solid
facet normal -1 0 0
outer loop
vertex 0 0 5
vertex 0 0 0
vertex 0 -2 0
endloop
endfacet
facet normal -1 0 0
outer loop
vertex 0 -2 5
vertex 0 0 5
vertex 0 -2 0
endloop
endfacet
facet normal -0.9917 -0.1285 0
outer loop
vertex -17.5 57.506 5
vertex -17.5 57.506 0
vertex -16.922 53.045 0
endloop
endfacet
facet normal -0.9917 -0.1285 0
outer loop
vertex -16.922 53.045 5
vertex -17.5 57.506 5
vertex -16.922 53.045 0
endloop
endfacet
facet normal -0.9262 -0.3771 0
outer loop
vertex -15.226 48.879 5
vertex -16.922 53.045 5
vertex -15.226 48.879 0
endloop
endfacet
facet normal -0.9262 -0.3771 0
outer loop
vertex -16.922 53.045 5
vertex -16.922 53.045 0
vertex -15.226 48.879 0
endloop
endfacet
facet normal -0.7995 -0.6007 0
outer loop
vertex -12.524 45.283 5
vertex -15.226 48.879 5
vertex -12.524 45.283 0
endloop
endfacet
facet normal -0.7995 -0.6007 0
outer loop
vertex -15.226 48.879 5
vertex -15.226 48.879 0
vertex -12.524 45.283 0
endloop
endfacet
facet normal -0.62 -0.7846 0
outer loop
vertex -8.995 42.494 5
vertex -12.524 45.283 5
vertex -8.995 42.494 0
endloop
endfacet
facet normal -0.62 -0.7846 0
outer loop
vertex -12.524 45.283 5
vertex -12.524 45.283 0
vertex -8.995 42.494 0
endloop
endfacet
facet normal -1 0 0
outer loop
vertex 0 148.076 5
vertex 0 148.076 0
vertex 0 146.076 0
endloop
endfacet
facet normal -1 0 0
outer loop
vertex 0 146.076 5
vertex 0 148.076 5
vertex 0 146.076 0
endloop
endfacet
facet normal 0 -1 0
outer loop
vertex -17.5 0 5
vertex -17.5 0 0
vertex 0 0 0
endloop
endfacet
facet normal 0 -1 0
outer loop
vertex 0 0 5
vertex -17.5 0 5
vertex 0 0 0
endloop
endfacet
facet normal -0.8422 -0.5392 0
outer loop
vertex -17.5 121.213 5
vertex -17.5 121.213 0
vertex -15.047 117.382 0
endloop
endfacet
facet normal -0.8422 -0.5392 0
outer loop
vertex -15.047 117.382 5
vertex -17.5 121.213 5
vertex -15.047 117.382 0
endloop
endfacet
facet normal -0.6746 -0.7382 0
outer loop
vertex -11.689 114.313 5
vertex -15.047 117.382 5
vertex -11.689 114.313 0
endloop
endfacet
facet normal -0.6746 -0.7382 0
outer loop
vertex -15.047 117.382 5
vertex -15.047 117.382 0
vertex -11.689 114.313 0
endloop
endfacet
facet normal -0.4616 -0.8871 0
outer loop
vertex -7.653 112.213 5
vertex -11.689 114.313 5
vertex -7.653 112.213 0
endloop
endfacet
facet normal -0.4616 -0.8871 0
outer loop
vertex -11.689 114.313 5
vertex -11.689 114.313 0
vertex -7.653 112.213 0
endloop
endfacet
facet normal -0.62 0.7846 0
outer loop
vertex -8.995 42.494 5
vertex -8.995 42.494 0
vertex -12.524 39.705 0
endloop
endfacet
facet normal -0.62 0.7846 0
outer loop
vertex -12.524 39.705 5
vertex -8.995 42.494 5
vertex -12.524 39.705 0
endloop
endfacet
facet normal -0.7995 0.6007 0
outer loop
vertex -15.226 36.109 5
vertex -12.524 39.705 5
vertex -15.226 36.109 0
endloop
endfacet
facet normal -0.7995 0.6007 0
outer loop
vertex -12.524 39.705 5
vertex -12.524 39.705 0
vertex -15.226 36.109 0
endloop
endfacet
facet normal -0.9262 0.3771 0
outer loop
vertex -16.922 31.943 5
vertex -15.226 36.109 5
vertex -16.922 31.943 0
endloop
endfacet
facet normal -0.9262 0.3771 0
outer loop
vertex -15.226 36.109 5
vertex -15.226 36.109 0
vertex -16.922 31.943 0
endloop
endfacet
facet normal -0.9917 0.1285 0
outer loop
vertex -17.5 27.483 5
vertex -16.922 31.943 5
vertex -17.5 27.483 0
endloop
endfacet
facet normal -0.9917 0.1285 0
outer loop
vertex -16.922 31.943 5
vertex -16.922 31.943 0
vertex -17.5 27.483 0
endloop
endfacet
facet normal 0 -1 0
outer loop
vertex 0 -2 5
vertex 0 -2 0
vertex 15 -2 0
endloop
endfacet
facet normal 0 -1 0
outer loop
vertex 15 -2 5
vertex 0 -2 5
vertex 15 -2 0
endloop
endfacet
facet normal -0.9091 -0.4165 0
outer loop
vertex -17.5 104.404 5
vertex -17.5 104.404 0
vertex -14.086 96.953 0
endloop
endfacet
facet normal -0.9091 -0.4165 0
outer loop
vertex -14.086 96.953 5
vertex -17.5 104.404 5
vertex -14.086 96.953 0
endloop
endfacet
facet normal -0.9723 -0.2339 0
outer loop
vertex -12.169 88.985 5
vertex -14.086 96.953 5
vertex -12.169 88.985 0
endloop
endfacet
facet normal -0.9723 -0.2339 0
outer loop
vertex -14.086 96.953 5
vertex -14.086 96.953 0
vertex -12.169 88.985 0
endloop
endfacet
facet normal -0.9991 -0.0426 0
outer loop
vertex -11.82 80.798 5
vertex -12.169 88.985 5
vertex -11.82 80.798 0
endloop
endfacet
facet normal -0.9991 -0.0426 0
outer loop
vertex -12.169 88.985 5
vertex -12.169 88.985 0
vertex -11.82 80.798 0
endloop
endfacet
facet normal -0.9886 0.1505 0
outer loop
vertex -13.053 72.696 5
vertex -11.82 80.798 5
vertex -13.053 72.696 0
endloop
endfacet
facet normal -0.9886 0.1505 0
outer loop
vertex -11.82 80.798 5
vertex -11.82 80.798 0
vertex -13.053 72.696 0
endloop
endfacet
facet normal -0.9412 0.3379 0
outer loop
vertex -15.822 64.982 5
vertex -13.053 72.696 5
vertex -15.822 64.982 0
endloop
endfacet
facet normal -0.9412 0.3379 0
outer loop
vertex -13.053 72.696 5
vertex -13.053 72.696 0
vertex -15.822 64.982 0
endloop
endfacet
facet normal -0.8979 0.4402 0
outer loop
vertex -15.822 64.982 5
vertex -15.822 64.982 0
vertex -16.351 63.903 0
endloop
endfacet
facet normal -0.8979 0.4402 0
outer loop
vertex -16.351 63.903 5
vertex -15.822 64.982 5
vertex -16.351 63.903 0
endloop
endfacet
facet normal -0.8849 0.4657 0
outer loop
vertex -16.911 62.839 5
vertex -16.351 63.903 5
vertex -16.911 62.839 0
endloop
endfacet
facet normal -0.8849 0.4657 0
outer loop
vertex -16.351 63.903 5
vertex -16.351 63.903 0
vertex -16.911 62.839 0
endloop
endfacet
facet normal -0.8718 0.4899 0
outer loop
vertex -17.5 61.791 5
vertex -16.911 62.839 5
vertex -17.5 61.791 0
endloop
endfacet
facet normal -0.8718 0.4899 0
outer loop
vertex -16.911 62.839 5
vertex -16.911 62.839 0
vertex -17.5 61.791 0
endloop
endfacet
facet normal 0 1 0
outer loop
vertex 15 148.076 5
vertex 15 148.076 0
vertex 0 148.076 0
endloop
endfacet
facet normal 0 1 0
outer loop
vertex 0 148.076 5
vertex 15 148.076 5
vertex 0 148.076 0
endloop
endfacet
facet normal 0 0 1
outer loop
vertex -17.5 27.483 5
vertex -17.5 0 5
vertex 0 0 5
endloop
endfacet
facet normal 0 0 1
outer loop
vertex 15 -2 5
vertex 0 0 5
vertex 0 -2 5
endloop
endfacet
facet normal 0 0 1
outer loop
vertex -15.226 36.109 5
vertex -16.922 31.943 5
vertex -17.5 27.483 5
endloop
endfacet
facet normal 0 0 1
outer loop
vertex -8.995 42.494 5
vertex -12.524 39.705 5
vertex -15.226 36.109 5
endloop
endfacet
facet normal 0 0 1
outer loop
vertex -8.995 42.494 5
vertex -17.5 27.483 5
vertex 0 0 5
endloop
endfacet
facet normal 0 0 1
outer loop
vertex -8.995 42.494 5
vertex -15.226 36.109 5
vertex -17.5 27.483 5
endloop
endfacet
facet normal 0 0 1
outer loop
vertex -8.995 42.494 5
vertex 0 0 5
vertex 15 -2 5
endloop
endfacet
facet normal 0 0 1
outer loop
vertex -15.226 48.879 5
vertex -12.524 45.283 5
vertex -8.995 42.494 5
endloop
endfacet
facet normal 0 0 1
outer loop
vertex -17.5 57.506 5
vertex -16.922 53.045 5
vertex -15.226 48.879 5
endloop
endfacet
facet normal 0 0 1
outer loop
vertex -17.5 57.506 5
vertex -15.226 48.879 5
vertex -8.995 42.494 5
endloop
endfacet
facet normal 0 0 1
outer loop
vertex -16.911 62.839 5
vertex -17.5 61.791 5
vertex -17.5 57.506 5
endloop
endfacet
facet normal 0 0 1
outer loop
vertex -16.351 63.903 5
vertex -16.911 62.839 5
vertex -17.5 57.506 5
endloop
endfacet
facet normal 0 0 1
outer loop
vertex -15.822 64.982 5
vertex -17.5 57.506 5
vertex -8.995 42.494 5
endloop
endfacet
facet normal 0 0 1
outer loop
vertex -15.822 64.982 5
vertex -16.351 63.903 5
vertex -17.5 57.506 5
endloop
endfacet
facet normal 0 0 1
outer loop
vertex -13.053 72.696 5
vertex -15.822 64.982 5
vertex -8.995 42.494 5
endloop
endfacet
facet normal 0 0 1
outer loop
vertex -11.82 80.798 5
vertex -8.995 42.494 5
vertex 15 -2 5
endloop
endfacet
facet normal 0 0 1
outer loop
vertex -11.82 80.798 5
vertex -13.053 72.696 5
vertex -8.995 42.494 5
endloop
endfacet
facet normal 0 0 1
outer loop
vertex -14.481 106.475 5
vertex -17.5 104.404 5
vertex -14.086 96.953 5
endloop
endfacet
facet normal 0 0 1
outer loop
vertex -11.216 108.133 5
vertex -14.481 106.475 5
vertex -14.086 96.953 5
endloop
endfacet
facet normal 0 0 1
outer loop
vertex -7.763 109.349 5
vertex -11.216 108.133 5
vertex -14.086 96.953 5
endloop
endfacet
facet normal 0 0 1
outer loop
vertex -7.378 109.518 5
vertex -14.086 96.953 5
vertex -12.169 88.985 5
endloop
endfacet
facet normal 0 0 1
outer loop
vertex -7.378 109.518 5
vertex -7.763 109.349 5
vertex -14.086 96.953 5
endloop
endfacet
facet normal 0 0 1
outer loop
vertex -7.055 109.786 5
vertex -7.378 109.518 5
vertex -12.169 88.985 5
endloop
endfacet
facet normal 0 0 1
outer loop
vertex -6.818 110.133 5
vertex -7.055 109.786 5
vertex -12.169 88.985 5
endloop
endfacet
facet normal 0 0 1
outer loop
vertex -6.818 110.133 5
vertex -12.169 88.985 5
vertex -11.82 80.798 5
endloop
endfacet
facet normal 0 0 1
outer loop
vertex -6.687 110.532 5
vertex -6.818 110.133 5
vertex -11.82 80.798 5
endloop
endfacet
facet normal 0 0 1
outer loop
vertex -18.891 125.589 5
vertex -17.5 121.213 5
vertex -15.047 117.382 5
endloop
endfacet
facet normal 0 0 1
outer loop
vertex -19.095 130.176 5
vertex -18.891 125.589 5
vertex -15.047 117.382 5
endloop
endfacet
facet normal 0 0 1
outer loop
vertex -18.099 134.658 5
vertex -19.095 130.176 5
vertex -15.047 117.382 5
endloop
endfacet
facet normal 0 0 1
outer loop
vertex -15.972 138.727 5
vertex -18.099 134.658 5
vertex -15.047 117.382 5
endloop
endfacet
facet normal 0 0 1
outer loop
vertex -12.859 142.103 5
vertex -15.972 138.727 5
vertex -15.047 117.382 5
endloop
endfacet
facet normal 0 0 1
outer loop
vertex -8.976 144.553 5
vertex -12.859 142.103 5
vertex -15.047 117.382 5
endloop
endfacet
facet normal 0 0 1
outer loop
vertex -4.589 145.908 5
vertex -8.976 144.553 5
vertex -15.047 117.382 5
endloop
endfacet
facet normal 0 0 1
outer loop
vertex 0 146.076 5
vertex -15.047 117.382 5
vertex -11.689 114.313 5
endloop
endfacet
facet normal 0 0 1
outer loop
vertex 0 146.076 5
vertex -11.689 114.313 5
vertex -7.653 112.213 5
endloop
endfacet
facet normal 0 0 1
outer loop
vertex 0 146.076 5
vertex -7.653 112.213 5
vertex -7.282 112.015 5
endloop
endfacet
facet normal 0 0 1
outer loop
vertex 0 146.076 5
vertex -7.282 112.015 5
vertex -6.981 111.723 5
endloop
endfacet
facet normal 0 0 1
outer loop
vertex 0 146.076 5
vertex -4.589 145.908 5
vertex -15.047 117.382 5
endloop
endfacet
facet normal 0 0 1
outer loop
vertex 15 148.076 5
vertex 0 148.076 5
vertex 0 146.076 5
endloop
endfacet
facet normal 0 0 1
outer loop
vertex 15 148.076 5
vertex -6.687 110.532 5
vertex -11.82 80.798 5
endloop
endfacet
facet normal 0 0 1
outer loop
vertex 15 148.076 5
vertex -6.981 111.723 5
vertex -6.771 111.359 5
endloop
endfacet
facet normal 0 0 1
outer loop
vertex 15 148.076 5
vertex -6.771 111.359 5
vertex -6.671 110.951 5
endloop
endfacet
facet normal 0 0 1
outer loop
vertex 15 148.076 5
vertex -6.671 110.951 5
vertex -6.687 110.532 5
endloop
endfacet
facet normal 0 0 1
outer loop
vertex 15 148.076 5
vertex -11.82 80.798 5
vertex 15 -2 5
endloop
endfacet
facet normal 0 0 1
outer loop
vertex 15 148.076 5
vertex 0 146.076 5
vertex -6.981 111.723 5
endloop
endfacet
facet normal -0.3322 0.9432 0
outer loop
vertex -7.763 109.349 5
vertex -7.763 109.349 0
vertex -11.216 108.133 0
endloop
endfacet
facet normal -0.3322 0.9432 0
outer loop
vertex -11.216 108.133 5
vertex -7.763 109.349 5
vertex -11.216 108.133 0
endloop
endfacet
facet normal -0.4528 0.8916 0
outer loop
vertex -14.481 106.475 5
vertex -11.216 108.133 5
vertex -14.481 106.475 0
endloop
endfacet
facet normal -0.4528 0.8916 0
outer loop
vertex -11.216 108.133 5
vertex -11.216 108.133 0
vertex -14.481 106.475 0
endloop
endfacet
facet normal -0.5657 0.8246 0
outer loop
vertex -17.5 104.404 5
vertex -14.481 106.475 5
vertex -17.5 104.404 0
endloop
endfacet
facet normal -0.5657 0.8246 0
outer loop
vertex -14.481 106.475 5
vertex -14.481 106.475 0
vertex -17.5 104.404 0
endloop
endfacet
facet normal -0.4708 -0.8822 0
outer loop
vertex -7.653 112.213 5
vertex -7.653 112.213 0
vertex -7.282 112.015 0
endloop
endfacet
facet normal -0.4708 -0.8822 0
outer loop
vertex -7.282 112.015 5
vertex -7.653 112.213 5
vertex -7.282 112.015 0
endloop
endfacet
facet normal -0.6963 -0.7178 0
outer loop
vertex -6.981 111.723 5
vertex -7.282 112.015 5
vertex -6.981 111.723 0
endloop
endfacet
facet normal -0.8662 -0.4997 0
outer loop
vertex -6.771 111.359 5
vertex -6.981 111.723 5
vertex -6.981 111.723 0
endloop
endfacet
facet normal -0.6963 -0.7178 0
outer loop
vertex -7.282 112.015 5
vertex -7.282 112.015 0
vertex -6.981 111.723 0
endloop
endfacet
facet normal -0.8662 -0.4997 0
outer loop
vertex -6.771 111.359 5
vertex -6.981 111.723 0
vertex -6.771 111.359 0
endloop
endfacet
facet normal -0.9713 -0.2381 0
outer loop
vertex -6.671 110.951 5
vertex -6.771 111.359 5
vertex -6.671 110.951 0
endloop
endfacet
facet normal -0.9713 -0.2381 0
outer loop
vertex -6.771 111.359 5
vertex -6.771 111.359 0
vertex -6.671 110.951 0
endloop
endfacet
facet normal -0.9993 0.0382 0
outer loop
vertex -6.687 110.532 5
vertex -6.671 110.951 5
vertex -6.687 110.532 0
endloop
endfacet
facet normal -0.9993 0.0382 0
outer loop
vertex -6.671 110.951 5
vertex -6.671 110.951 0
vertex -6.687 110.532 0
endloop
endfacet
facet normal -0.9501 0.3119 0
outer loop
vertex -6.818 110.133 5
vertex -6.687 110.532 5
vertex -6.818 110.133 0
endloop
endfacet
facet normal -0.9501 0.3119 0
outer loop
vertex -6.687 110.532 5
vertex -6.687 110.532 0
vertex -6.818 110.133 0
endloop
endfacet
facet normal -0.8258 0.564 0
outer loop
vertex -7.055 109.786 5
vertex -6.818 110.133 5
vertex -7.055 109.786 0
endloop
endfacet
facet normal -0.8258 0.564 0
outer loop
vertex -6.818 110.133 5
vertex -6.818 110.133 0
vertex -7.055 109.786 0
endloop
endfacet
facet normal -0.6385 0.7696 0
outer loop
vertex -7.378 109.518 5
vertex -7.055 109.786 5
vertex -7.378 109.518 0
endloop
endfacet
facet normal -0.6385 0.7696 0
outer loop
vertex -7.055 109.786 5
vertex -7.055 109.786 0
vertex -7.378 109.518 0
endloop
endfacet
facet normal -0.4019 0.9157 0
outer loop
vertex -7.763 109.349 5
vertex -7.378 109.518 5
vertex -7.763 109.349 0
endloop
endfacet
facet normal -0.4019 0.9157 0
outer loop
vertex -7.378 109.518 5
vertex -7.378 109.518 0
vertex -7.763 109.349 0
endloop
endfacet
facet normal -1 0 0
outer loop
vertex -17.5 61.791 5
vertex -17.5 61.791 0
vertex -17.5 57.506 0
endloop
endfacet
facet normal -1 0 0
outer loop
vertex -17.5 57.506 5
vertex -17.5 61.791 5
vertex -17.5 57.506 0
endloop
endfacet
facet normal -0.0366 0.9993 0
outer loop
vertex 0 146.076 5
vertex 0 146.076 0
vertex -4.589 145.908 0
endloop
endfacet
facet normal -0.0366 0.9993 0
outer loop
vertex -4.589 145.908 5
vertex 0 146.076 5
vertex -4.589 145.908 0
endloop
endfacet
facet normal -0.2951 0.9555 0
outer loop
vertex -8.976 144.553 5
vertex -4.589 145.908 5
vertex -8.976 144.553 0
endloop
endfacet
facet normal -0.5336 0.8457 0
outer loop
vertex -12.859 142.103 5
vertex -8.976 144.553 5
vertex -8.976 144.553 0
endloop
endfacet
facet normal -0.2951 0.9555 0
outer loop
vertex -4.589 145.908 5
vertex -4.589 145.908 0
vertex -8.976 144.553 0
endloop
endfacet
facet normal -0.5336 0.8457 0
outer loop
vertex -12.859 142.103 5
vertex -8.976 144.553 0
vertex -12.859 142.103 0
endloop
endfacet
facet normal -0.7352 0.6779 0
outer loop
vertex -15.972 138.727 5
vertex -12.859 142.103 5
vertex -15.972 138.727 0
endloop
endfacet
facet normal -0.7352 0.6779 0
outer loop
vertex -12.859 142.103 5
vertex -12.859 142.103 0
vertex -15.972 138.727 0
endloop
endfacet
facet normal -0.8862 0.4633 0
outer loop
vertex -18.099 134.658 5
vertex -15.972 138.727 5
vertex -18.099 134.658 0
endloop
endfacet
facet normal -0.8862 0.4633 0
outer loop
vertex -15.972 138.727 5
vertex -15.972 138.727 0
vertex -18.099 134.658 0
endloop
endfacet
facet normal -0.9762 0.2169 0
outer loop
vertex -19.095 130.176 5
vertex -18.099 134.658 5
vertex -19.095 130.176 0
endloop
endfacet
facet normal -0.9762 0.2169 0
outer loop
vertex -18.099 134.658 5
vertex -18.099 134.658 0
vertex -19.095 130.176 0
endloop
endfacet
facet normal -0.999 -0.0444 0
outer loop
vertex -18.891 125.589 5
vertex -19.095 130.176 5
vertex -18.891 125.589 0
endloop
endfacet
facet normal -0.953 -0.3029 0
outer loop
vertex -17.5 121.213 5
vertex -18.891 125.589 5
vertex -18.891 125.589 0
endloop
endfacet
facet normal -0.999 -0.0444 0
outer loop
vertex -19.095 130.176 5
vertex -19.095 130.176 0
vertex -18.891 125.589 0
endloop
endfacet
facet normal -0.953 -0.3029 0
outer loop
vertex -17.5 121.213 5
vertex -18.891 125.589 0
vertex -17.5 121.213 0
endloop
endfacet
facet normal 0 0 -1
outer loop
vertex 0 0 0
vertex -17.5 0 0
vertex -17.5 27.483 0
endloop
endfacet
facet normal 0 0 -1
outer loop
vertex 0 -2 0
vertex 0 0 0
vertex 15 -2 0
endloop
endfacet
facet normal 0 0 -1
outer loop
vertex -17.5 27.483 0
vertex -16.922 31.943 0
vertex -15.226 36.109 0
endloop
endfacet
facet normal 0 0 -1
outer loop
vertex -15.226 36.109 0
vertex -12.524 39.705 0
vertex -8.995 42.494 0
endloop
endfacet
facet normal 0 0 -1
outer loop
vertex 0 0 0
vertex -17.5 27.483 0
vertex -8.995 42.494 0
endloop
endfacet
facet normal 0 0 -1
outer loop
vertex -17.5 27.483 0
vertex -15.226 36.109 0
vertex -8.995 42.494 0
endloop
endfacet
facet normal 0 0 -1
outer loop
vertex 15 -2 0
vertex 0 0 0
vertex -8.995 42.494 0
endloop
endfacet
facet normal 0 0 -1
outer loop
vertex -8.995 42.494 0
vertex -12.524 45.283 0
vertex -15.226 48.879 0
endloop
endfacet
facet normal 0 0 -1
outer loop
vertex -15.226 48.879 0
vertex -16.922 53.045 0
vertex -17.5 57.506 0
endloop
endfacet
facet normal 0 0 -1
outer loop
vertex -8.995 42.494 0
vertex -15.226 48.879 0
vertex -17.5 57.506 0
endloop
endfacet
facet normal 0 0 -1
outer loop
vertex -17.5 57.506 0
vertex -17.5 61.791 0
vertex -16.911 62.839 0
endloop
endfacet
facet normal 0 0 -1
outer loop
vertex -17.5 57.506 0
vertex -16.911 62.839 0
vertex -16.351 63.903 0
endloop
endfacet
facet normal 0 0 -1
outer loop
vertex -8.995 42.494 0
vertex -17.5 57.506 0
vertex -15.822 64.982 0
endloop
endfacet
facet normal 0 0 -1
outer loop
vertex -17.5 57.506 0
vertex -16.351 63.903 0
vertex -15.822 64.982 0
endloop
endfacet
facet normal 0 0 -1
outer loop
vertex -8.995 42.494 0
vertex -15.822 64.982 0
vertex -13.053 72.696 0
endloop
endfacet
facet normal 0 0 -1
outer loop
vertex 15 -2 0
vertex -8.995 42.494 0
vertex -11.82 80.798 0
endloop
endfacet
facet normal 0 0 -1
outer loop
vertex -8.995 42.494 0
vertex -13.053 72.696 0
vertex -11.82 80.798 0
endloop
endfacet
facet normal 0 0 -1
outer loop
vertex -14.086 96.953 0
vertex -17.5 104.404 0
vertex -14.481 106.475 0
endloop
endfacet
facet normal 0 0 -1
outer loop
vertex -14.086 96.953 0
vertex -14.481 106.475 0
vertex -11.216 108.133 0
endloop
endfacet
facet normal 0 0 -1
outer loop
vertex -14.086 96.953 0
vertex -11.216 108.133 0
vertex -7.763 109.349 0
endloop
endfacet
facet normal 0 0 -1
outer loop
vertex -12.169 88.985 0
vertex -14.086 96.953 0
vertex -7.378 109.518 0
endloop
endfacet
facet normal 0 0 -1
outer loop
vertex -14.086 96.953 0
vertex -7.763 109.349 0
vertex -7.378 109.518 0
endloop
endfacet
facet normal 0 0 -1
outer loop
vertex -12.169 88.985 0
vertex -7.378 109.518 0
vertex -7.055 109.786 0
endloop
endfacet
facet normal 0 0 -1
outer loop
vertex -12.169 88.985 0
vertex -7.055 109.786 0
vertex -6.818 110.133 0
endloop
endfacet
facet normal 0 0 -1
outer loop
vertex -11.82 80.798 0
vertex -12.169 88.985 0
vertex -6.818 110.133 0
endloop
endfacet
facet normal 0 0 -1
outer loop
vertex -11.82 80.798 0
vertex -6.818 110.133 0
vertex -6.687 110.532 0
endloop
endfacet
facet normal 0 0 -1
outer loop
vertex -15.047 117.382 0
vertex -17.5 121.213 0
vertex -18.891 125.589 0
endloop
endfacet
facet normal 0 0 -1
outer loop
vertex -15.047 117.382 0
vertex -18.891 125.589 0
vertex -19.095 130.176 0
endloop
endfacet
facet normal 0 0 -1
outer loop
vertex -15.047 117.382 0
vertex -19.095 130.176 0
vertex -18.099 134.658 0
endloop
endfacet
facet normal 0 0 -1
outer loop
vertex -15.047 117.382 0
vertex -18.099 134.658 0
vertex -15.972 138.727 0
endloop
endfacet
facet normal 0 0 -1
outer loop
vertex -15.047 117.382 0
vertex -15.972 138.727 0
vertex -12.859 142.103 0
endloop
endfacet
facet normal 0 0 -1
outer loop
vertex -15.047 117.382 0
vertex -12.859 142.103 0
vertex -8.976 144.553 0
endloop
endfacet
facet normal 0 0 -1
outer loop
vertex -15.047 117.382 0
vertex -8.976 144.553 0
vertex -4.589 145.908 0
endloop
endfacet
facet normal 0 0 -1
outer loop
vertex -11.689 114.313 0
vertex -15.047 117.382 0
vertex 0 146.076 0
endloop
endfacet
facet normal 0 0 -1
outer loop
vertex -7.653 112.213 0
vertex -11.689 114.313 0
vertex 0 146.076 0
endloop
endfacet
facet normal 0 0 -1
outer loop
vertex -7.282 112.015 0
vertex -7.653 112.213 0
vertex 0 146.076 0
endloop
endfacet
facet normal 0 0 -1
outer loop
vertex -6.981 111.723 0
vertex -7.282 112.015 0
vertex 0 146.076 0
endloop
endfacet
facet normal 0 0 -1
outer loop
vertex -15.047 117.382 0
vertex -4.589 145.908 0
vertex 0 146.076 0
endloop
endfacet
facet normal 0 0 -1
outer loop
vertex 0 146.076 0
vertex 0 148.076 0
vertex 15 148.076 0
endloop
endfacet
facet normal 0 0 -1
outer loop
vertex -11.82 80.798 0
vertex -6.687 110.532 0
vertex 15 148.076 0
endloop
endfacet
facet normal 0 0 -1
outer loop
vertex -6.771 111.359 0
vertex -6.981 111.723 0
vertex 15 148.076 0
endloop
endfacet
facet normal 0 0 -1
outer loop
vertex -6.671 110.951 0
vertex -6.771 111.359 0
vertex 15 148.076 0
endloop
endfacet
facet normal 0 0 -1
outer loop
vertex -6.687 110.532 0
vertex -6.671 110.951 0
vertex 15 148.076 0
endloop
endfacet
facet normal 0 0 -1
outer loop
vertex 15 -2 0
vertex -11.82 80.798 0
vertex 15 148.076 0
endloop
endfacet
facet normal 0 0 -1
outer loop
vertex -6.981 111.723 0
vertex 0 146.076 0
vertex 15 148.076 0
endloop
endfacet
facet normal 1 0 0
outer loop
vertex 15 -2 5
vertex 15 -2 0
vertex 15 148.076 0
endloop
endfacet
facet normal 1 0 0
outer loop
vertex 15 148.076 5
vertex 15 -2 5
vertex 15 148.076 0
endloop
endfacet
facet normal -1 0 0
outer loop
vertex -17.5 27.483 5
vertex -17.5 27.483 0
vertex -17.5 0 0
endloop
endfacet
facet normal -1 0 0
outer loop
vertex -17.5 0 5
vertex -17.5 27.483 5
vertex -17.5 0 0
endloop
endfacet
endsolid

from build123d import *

# Parameters (mm, degrees)
F1_DEPTH = 5


with BuildPart() as f1:
    # F0 (on Top) → F1 (new body)
    with BuildSketch(Plane.XY):
        with BuildLine():
            Line((-17.5, 0), (0, 0))
            Line((0, 0), (0, 128.654855))
            Line((0, 128.654855), (0, 146.075832))
            ThreePointArc((0, 146.075832), (-15.971755, 138.727485), (-17.5, 121.21293))
            ThreePointArc((-17.5, 121.21293), (-13.467707, 115.73757), (-7.652815, 112.212517))
            ThreePointArc((-7.652815, 112.212517), (-6.664225, 110.740832), (-7.762637, 109.349193))
            ThreePointArc((-7.762637, 109.349193), (-12.875909, 107.357911), (-17.5, 104.403503))
            ThreePointArc((-17.5, 104.403503), (-11.796165, 84.899955), (-15.822386, 64.982333))
            ThreePointArc((-15.822386, 64.982333), (-17.075447, 61.336897), (-17.5, 57.505563))
            ThreePointArc((-17.5, 57.505563), (-15.225923, 48.878786), (-8.994711, 42.494061))
            ThreePointArc((-8.994711, 42.494061), (-15.225923, 36.109337), (-17.5, 27.48256))
            Line((-17.5, 27.48256), (-17.5, 0))
        make_face()
        Polygon((0, 128.654855), (0, 0), (0, -2), (15, -2), (15, 148.075832), (0, 148.075832), (0, 146.075832), align=None)
        with BuildLine():
            Line((-17.5, 61.790957), (-17.5, 57.505563))
            ThreePointArc((-17.5, 57.505563), (-17.075447, 61.336897), (-15.822386, 64.982333))
            ThreePointArc((-15.822386, 64.982333), (-16.627255, 63.368805), (-17.5, 61.790957))
        make_face()
    extrude(amount=F1_DEPTH)


solid = f1.part
